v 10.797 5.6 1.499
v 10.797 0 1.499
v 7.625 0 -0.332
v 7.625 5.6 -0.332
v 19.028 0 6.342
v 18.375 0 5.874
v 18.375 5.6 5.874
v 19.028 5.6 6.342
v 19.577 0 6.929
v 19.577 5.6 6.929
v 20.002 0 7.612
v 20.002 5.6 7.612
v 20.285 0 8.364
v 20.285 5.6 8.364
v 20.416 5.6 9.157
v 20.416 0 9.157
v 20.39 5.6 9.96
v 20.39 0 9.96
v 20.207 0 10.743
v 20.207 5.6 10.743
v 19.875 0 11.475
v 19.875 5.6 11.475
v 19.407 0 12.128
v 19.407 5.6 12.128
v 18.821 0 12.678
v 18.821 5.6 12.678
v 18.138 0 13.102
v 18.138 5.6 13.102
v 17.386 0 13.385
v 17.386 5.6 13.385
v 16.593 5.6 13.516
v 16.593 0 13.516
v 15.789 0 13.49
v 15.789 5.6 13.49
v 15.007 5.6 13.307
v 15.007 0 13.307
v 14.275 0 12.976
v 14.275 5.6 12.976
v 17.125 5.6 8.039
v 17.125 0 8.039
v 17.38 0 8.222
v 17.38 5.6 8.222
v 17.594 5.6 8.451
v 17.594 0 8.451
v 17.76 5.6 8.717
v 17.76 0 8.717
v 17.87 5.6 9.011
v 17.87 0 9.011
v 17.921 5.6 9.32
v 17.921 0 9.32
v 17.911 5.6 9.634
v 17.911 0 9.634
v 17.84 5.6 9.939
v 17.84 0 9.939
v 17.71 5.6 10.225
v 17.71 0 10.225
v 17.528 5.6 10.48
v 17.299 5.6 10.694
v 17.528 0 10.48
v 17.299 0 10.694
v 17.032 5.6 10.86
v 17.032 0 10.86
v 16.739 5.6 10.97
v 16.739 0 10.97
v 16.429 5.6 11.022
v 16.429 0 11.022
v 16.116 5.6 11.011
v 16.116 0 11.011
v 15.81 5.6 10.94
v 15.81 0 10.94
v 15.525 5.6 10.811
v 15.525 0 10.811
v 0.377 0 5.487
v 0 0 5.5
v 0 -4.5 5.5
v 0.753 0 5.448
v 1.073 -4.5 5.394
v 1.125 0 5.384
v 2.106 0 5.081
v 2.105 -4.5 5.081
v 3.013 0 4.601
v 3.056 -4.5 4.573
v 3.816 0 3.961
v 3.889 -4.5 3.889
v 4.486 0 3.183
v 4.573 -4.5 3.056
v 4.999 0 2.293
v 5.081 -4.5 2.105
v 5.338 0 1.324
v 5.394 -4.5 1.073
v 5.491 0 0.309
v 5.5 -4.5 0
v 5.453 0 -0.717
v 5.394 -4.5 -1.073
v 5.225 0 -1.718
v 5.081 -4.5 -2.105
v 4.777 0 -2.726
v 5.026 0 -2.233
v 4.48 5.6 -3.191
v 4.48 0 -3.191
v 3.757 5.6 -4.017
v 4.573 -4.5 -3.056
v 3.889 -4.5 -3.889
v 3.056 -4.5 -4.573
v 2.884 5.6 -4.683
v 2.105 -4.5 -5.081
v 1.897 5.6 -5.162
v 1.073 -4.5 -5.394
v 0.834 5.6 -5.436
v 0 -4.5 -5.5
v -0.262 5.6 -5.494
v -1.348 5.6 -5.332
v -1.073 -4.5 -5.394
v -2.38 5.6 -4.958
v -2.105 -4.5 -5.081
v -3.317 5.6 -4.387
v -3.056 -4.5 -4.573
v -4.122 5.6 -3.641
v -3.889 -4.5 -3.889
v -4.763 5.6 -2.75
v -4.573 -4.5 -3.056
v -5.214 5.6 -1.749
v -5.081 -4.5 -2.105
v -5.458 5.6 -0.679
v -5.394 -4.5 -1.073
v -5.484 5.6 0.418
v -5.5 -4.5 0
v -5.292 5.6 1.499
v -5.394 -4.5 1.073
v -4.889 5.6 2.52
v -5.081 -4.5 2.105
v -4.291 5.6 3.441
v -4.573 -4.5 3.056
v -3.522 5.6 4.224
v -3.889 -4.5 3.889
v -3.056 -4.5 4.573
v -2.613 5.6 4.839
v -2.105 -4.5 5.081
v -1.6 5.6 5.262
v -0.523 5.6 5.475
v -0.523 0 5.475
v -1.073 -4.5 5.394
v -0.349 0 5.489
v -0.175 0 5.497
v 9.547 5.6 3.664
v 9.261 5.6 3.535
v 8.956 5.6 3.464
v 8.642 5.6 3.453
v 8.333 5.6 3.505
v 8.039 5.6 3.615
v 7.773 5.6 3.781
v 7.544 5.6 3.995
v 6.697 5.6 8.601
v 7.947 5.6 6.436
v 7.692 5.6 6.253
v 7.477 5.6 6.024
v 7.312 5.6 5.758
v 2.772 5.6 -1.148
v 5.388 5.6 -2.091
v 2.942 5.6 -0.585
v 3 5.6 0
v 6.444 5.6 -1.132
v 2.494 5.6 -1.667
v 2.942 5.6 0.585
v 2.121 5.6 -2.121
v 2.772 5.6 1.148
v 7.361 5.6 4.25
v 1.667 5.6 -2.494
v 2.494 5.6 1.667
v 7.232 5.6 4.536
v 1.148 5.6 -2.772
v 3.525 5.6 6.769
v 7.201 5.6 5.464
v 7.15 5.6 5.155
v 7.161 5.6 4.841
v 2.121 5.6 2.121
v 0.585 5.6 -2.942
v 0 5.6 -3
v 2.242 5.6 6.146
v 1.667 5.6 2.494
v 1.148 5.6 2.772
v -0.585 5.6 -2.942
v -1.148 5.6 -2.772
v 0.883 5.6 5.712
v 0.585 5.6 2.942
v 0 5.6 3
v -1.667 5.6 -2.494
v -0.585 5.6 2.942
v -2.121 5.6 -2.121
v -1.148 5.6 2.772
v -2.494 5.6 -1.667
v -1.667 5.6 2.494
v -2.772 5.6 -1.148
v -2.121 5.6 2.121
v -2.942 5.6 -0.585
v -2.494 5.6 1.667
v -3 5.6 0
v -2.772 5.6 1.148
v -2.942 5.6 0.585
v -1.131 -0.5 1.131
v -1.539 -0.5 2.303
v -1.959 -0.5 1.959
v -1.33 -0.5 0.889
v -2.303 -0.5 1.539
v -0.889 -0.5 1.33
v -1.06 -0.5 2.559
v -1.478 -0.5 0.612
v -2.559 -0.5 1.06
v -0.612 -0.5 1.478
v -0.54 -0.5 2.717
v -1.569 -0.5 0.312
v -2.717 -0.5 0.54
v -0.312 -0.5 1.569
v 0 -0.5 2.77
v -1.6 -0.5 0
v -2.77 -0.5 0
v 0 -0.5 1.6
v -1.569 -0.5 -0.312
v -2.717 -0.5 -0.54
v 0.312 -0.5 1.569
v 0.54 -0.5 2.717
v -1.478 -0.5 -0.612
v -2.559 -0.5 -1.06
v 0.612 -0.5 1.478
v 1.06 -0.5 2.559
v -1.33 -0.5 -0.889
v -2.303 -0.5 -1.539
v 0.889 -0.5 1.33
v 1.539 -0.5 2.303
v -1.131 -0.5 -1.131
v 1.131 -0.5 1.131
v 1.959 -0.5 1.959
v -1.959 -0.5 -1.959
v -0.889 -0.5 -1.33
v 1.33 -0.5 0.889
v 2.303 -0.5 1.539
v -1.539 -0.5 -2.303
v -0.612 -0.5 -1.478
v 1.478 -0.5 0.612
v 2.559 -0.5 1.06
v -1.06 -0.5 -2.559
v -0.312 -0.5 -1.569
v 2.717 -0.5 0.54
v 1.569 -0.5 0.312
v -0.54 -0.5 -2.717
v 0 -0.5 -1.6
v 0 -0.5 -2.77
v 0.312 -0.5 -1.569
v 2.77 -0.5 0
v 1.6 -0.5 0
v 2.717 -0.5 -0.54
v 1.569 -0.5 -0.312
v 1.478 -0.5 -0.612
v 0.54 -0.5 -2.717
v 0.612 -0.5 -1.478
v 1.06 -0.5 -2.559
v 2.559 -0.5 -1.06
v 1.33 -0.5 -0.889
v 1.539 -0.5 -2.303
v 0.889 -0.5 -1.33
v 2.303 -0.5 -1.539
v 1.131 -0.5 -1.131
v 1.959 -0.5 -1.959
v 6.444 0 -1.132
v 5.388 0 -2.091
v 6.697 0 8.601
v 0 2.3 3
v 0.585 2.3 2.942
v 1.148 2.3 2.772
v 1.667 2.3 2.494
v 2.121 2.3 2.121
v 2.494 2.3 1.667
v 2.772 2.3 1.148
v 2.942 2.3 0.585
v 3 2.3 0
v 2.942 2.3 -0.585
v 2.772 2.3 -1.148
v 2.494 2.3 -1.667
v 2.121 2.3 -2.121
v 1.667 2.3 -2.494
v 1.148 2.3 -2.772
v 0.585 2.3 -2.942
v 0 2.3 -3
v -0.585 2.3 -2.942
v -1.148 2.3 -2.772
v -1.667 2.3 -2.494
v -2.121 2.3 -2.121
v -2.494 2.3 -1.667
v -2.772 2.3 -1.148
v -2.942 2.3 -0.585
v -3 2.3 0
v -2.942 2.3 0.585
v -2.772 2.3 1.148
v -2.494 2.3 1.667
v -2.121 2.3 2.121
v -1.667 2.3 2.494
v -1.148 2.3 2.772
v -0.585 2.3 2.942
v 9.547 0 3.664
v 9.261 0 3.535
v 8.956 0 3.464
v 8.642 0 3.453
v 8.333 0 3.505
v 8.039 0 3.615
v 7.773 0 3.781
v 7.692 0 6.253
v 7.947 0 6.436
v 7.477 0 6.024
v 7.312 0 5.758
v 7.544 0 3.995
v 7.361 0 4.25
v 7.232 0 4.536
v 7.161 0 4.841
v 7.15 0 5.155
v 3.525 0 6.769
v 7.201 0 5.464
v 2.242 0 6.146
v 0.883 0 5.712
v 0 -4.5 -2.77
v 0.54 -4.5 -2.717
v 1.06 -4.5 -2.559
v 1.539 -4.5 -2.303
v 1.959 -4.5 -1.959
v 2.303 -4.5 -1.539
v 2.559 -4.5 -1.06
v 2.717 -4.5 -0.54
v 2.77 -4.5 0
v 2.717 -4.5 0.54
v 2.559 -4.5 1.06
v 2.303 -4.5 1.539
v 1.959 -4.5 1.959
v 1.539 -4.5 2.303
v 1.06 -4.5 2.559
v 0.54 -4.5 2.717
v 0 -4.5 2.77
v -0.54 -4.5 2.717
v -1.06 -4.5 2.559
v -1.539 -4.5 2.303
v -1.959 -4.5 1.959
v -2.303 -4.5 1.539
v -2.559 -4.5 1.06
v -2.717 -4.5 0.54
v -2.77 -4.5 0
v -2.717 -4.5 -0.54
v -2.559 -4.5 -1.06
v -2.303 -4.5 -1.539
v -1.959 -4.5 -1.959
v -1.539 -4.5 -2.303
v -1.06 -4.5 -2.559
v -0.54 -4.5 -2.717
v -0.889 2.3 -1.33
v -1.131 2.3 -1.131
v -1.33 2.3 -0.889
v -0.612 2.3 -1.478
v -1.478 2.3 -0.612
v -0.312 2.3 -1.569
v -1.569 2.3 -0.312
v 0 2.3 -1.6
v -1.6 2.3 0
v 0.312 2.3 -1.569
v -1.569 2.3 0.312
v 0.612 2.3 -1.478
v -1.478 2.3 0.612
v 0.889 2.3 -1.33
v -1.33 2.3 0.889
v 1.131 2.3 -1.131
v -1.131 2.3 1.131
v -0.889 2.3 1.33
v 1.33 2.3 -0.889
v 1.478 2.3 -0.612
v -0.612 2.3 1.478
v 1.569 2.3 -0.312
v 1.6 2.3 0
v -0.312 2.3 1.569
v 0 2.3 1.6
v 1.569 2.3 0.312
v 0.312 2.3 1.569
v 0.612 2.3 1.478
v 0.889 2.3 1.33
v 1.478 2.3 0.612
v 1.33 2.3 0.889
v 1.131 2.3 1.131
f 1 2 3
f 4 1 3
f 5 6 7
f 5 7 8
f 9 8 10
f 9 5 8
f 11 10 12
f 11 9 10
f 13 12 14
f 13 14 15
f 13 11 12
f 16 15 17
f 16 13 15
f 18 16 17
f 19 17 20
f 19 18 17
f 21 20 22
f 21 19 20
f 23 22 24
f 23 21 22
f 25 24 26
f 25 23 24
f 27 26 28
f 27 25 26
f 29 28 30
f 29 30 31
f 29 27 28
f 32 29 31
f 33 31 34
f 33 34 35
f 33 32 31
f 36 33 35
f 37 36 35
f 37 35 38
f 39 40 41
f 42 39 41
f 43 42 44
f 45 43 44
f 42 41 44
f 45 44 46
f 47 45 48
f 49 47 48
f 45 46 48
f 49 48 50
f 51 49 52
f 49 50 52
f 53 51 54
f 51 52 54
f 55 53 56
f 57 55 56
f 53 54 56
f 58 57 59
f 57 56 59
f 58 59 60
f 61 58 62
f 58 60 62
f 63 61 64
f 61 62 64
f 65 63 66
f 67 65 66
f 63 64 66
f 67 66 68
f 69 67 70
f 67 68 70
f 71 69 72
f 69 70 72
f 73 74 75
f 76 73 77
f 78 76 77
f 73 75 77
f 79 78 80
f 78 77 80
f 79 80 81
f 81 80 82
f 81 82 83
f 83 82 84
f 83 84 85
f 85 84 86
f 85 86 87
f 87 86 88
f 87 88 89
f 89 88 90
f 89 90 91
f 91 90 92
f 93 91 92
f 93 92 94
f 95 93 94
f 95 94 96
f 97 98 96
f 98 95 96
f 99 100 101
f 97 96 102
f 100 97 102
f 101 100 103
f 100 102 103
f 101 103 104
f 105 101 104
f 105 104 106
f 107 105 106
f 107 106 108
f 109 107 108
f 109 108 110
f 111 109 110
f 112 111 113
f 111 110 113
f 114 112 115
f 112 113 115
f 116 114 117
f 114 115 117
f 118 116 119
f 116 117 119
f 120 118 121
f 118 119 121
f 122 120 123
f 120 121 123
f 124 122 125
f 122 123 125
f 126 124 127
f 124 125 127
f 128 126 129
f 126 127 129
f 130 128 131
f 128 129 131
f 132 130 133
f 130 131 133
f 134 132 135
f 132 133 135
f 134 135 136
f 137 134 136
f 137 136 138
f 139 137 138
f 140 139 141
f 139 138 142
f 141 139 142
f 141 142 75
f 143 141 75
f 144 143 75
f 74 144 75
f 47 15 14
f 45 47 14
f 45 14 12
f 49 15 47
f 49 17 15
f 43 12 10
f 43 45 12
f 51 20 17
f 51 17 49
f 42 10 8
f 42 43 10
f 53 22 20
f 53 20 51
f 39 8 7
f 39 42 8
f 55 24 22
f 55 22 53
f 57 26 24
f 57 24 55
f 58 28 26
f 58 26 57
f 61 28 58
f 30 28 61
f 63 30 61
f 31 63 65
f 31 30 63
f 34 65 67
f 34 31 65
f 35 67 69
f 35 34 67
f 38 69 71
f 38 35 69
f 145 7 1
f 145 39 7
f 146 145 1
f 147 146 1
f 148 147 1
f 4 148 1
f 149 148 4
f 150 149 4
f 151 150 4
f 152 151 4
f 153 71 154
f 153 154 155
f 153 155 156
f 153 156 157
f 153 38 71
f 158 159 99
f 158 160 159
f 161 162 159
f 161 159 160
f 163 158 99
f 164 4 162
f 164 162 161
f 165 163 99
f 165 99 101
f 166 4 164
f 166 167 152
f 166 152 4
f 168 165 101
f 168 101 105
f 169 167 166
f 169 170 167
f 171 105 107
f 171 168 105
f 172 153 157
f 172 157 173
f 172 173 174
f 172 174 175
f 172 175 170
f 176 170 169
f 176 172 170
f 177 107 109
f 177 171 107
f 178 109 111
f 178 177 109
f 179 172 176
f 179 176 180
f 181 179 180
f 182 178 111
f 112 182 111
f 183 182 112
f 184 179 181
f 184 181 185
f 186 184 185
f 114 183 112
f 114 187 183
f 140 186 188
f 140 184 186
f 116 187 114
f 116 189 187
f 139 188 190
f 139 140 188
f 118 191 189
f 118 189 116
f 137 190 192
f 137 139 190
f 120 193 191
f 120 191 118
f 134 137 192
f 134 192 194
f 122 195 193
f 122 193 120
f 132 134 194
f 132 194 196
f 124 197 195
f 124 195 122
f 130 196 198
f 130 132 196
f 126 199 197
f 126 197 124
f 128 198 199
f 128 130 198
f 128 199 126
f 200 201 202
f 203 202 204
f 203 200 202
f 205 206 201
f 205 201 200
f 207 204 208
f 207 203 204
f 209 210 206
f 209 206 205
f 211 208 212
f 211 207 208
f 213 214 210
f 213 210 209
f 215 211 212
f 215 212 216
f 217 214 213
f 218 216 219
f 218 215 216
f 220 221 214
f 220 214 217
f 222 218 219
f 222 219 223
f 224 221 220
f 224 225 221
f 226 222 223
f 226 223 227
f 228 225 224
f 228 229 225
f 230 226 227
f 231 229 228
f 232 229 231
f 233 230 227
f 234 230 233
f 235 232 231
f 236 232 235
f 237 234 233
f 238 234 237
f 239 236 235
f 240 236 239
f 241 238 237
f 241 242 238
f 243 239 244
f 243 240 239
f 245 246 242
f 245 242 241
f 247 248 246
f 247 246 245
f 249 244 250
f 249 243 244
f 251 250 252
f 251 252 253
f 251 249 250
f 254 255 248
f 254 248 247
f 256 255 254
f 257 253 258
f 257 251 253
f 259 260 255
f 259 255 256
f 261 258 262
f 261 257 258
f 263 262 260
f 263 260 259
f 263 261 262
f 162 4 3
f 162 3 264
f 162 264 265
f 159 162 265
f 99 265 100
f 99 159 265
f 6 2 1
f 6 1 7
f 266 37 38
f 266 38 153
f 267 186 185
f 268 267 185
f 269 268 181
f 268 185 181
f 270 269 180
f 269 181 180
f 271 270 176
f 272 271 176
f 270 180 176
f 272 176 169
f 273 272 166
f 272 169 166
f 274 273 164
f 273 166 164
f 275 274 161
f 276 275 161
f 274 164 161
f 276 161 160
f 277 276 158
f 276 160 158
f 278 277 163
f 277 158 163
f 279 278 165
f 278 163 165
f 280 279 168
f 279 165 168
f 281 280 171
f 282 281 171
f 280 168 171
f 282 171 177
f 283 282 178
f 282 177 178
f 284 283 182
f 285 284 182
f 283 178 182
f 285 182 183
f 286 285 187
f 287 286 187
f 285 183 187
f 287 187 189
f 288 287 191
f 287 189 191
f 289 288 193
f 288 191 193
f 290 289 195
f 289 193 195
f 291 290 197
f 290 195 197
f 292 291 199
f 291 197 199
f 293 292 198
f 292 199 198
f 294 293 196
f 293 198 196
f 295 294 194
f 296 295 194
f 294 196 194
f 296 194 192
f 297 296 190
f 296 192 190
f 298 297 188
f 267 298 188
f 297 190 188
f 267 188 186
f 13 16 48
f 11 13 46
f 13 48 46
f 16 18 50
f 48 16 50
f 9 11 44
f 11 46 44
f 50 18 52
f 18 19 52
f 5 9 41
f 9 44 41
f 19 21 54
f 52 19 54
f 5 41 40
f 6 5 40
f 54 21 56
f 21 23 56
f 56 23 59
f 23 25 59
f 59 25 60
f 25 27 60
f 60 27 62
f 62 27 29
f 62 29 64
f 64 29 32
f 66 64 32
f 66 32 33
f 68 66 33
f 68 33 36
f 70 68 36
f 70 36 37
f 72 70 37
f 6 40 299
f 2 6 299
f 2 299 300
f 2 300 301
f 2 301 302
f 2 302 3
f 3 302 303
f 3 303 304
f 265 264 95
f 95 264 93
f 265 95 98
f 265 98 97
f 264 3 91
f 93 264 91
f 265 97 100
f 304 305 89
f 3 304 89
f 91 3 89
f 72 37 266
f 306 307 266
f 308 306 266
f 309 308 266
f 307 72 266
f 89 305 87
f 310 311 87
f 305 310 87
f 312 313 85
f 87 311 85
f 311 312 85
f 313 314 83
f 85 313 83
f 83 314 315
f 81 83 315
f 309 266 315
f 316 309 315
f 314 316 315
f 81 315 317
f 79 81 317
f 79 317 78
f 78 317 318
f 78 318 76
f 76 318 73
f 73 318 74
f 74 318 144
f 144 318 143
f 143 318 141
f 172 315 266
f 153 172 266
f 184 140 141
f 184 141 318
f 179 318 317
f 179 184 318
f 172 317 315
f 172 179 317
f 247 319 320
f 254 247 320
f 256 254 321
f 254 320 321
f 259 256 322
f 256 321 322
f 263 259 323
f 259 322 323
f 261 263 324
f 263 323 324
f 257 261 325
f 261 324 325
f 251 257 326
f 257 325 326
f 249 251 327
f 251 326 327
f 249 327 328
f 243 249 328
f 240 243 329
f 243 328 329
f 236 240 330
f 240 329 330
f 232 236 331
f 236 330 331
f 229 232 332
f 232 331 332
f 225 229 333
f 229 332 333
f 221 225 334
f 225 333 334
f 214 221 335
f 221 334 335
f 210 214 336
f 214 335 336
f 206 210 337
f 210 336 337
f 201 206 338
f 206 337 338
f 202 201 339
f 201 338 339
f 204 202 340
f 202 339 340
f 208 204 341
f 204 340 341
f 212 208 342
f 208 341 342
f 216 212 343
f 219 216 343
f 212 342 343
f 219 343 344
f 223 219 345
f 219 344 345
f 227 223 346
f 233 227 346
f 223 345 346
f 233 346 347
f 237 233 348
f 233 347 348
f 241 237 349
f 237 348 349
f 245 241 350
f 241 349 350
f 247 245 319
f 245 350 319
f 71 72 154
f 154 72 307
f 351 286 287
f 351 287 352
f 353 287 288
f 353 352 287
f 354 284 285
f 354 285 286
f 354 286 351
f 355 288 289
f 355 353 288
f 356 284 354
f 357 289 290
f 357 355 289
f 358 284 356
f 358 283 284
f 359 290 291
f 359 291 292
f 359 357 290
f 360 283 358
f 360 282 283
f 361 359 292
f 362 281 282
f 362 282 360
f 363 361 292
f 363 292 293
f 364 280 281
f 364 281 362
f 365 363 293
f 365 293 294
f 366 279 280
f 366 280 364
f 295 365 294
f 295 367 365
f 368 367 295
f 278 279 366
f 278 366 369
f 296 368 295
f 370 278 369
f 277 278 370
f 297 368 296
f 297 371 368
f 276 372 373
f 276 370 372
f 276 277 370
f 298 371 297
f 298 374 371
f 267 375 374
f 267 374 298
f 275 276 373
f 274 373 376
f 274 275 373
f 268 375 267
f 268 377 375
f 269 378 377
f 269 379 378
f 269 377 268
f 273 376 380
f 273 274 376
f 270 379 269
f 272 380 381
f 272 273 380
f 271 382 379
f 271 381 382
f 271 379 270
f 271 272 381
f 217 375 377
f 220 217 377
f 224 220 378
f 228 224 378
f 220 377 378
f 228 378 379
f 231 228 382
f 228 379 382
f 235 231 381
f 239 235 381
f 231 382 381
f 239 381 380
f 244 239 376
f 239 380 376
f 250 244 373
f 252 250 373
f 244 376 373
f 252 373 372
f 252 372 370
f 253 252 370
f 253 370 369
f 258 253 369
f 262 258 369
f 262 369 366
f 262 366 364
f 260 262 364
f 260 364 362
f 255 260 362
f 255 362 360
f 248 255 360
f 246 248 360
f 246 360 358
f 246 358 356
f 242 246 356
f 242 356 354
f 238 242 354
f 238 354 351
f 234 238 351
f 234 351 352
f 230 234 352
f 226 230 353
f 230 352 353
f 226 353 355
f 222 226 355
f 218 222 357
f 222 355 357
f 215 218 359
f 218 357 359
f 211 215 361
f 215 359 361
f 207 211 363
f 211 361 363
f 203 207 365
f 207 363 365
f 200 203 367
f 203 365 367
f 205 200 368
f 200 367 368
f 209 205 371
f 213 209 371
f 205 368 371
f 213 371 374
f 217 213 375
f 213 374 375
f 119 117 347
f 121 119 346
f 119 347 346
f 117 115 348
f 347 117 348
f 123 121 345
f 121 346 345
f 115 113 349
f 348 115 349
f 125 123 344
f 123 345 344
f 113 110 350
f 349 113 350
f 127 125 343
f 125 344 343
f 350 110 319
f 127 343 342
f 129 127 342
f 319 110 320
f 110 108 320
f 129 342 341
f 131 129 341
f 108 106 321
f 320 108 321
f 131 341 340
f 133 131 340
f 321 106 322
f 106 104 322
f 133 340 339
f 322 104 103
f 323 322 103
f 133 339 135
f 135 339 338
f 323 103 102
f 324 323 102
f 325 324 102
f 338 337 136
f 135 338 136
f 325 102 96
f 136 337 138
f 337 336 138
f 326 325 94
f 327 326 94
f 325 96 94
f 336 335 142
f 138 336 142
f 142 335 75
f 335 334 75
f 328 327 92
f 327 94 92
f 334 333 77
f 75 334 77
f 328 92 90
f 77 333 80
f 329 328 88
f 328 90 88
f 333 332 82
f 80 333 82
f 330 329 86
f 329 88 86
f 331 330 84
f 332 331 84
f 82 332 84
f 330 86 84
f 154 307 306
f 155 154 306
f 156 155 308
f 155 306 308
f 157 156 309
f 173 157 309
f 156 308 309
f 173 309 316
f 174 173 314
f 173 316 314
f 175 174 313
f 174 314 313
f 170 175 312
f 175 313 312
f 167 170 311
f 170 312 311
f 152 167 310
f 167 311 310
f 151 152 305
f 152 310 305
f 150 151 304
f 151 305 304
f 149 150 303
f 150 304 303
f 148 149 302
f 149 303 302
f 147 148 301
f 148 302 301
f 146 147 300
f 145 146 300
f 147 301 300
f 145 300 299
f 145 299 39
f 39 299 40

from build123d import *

# Parameters (mm, degrees)
EXTRUDE_THIN2_DEPTH      = 5.6
BOSS_EXTRUDE1_DEPTH      = 5.6
BOSS_EXTRUDE2_DEPTH      = 5.6
BOSS_EXTRUDE2_DEPTH_BACK = 4.5
SKETCH6_R                = 5.5
FILLET1_R                = 10
SKETCH7_R                = 2.77
CUT_EXTRUDE3_DEPTH       = 4
SKETCH9_R                = 3
CUT_EXTRUDE5_DEPTH       = 3.3
SKETCH10_R               = 1.6
CUT_EXTRUDE6_DEPTH       = 26.423002314


with BuildPart() as part:
    # Sketch4 → Extrude-Thin2 (new body)
    with BuildSketch(Plane(origin=(0, 0, 0), x_dir=(1, 0, 0), z_dir=(0, 1, 0))):
        with BuildLine():
            Line((10.796856578, -1.499295844), (18.374578861, -5.874295844))
            ThreePointArc((18.374578861, -5.874295844), (19.875283017, -11.475), (14.274578861, -12.975704156))
            Line((14.274578861, -12.975704156), (6.696856578, -8.600704156))
            ThreePointArc((6.696856578, -8.600704156), (5.196152423, -3), (10.796856578, -1.499295844))
        make_face()
        with BuildLine():
            Line((9.546856578, -3.664359354), (17.124578861, -8.039359354))
            ThreePointArc((17.124578861, -8.039359354), (17.710219507, -10.225), (15.524578861, -10.810640646))
            Line((15.524578861, -10.810640646), (7.946856578, -6.435640646))
            ThreePointArc((7.946856578, -6.435640646), (7.361215932, -4.25), (9.546856578, -3.664359354))
        make_face(mode=Mode.SUBTRACT)
    extrude(amount=EXTRUDE_THIN2_DEPTH)

    # Sketch5 → Boss-Extrude1 (add)
    with BuildSketch(Plane(origin=(0, 0, 0), x_dir=(1, 0, 0), z_dir=(0, 1, 0))):
        with BuildLine():
            Line((10.796856578, -1.499295844), (2.05, 3.550704156))
            ThreePointArc((2.05, 3.550704156), (-3.550704156, 2.05), (-2.05, -3.550704156))
            Line((-2.05, -3.550704156), (6.696856578, -8.600704156))
            ThreePointArc((6.696856578, -8.600704156), (8.998238507, -9.142286296), (11.216030786, -8.323099255))
            Line((11.216030786, -8.323099255), (7.946856578, -6.435640646))
            ThreePointArc((7.946856578, -6.435640646), (7.361215932, -4.25), (9.546856578, -3.664359354))
            Line((9.546856578, -3.664359354), (12.816030786, -5.551817963))
            ThreePointArc((12.816030786, -5.551817963), (12.416571434, -3.221559989), (10.796856578, -1.499295844))
        make_face()
    extrude(amount=BOSS_EXTRUDE1_DEPTH)

    # Sketch6 → Boss-Extrude2 (add, two sides: drawn at the far end of the back side and taken through both)
    with BuildSketch(Plane(origin=(0, 0, 0), x_dir=(1, 0, 0), z_dir=(0, 1, 0)).offset(-BOSS_EXTRUDE2_DEPTH_BACK)):
        with Locations(Location((0, 0, 0), (0, 0, 270))):
            Circle(SKETCH6_R)
    extrude(amount=BOSS_EXTRUDE2_DEPTH + BOSS_EXTRUDE2_DEPTH_BACK)

    # Fillet1
    # the kernel refuses this fillet: 10 mm, written as the material it adds along each edge
    with BuildSketch(Plane(origin=(1.124901573, 5.6, 5.383734433), x_dir=(0.8660254037844402, 0, 0.4999999999999975), z_dir=(0, -1, 0))) as fillet1_piece_1:
        with BuildLine():
            CenterArc((2.77133022, 10), FILLET1_R, 245.460811273, 24.539188727)
            ThreePointArc((-1.381825119, 0.903225806), (-0.65683145, 0.503752837), (0, 0))
            Line((0, 0), (2.77133022, 0))
        make_face()
    extrude(amount=5.6)
    with BuildSketch(Plane(origin=(5.224901573, 5.6, -1.717673878), x_dir=(0.8660254037844397, 0, 0.49999999999999806), z_dir=(0, -1, 0))) as fillet1_piece_2:
        with BuildLine():
            CenterArc((2.77133022, -10), FILLET1_R, 90, 24.539188727)
            ThreePointArc((-1.381825119, -0.903225806), (-0.65683145, -0.503752837), (0, 0))
            Line((0, 0), (2.77133022, 0))
        make_face()
    extrude(amount=5.6)

    # Sketch7 → Cut-Extrude3 (cut)
    with BuildSketch(Plane.XZ.offset(4.5)):
        with Locations(Location((0, 0, 0), (0, 0, 270))):
            Circle(SKETCH7_R)
    extrude(amount=-CUT_EXTRUDE3_DEPTH, mode=Mode.SUBTRACT)

    # Sketch9 → Cut-Extrude5 (cut)
    with BuildSketch(Plane(origin=(0, 5.6, 0), x_dir=(1, 0, 0), z_dir=(0, 1, 0))):
        with Locations(Location((0, 0, 0), (0, 0, 270))):
            Circle(SKETCH9_R)
    extrude(amount=-CUT_EXTRUDE5_DEPTH, mode=Mode.SUBTRACT)

    # Sketch10 → Cut-Extrude6 (cut, through all)
    with BuildSketch(Plane(origin=(0, 2.3, 0), x_dir=(1, 0, 0), z_dir=(0, 1, 0))):
        with Locations(Location((0, 0, 0), (0, 0, 270))):
            Circle(SKETCH10_R)
    extrude(amount=-CUT_EXTRUDE6_DEPTH, mode=Mode.SUBTRACT)


solid = part.part
